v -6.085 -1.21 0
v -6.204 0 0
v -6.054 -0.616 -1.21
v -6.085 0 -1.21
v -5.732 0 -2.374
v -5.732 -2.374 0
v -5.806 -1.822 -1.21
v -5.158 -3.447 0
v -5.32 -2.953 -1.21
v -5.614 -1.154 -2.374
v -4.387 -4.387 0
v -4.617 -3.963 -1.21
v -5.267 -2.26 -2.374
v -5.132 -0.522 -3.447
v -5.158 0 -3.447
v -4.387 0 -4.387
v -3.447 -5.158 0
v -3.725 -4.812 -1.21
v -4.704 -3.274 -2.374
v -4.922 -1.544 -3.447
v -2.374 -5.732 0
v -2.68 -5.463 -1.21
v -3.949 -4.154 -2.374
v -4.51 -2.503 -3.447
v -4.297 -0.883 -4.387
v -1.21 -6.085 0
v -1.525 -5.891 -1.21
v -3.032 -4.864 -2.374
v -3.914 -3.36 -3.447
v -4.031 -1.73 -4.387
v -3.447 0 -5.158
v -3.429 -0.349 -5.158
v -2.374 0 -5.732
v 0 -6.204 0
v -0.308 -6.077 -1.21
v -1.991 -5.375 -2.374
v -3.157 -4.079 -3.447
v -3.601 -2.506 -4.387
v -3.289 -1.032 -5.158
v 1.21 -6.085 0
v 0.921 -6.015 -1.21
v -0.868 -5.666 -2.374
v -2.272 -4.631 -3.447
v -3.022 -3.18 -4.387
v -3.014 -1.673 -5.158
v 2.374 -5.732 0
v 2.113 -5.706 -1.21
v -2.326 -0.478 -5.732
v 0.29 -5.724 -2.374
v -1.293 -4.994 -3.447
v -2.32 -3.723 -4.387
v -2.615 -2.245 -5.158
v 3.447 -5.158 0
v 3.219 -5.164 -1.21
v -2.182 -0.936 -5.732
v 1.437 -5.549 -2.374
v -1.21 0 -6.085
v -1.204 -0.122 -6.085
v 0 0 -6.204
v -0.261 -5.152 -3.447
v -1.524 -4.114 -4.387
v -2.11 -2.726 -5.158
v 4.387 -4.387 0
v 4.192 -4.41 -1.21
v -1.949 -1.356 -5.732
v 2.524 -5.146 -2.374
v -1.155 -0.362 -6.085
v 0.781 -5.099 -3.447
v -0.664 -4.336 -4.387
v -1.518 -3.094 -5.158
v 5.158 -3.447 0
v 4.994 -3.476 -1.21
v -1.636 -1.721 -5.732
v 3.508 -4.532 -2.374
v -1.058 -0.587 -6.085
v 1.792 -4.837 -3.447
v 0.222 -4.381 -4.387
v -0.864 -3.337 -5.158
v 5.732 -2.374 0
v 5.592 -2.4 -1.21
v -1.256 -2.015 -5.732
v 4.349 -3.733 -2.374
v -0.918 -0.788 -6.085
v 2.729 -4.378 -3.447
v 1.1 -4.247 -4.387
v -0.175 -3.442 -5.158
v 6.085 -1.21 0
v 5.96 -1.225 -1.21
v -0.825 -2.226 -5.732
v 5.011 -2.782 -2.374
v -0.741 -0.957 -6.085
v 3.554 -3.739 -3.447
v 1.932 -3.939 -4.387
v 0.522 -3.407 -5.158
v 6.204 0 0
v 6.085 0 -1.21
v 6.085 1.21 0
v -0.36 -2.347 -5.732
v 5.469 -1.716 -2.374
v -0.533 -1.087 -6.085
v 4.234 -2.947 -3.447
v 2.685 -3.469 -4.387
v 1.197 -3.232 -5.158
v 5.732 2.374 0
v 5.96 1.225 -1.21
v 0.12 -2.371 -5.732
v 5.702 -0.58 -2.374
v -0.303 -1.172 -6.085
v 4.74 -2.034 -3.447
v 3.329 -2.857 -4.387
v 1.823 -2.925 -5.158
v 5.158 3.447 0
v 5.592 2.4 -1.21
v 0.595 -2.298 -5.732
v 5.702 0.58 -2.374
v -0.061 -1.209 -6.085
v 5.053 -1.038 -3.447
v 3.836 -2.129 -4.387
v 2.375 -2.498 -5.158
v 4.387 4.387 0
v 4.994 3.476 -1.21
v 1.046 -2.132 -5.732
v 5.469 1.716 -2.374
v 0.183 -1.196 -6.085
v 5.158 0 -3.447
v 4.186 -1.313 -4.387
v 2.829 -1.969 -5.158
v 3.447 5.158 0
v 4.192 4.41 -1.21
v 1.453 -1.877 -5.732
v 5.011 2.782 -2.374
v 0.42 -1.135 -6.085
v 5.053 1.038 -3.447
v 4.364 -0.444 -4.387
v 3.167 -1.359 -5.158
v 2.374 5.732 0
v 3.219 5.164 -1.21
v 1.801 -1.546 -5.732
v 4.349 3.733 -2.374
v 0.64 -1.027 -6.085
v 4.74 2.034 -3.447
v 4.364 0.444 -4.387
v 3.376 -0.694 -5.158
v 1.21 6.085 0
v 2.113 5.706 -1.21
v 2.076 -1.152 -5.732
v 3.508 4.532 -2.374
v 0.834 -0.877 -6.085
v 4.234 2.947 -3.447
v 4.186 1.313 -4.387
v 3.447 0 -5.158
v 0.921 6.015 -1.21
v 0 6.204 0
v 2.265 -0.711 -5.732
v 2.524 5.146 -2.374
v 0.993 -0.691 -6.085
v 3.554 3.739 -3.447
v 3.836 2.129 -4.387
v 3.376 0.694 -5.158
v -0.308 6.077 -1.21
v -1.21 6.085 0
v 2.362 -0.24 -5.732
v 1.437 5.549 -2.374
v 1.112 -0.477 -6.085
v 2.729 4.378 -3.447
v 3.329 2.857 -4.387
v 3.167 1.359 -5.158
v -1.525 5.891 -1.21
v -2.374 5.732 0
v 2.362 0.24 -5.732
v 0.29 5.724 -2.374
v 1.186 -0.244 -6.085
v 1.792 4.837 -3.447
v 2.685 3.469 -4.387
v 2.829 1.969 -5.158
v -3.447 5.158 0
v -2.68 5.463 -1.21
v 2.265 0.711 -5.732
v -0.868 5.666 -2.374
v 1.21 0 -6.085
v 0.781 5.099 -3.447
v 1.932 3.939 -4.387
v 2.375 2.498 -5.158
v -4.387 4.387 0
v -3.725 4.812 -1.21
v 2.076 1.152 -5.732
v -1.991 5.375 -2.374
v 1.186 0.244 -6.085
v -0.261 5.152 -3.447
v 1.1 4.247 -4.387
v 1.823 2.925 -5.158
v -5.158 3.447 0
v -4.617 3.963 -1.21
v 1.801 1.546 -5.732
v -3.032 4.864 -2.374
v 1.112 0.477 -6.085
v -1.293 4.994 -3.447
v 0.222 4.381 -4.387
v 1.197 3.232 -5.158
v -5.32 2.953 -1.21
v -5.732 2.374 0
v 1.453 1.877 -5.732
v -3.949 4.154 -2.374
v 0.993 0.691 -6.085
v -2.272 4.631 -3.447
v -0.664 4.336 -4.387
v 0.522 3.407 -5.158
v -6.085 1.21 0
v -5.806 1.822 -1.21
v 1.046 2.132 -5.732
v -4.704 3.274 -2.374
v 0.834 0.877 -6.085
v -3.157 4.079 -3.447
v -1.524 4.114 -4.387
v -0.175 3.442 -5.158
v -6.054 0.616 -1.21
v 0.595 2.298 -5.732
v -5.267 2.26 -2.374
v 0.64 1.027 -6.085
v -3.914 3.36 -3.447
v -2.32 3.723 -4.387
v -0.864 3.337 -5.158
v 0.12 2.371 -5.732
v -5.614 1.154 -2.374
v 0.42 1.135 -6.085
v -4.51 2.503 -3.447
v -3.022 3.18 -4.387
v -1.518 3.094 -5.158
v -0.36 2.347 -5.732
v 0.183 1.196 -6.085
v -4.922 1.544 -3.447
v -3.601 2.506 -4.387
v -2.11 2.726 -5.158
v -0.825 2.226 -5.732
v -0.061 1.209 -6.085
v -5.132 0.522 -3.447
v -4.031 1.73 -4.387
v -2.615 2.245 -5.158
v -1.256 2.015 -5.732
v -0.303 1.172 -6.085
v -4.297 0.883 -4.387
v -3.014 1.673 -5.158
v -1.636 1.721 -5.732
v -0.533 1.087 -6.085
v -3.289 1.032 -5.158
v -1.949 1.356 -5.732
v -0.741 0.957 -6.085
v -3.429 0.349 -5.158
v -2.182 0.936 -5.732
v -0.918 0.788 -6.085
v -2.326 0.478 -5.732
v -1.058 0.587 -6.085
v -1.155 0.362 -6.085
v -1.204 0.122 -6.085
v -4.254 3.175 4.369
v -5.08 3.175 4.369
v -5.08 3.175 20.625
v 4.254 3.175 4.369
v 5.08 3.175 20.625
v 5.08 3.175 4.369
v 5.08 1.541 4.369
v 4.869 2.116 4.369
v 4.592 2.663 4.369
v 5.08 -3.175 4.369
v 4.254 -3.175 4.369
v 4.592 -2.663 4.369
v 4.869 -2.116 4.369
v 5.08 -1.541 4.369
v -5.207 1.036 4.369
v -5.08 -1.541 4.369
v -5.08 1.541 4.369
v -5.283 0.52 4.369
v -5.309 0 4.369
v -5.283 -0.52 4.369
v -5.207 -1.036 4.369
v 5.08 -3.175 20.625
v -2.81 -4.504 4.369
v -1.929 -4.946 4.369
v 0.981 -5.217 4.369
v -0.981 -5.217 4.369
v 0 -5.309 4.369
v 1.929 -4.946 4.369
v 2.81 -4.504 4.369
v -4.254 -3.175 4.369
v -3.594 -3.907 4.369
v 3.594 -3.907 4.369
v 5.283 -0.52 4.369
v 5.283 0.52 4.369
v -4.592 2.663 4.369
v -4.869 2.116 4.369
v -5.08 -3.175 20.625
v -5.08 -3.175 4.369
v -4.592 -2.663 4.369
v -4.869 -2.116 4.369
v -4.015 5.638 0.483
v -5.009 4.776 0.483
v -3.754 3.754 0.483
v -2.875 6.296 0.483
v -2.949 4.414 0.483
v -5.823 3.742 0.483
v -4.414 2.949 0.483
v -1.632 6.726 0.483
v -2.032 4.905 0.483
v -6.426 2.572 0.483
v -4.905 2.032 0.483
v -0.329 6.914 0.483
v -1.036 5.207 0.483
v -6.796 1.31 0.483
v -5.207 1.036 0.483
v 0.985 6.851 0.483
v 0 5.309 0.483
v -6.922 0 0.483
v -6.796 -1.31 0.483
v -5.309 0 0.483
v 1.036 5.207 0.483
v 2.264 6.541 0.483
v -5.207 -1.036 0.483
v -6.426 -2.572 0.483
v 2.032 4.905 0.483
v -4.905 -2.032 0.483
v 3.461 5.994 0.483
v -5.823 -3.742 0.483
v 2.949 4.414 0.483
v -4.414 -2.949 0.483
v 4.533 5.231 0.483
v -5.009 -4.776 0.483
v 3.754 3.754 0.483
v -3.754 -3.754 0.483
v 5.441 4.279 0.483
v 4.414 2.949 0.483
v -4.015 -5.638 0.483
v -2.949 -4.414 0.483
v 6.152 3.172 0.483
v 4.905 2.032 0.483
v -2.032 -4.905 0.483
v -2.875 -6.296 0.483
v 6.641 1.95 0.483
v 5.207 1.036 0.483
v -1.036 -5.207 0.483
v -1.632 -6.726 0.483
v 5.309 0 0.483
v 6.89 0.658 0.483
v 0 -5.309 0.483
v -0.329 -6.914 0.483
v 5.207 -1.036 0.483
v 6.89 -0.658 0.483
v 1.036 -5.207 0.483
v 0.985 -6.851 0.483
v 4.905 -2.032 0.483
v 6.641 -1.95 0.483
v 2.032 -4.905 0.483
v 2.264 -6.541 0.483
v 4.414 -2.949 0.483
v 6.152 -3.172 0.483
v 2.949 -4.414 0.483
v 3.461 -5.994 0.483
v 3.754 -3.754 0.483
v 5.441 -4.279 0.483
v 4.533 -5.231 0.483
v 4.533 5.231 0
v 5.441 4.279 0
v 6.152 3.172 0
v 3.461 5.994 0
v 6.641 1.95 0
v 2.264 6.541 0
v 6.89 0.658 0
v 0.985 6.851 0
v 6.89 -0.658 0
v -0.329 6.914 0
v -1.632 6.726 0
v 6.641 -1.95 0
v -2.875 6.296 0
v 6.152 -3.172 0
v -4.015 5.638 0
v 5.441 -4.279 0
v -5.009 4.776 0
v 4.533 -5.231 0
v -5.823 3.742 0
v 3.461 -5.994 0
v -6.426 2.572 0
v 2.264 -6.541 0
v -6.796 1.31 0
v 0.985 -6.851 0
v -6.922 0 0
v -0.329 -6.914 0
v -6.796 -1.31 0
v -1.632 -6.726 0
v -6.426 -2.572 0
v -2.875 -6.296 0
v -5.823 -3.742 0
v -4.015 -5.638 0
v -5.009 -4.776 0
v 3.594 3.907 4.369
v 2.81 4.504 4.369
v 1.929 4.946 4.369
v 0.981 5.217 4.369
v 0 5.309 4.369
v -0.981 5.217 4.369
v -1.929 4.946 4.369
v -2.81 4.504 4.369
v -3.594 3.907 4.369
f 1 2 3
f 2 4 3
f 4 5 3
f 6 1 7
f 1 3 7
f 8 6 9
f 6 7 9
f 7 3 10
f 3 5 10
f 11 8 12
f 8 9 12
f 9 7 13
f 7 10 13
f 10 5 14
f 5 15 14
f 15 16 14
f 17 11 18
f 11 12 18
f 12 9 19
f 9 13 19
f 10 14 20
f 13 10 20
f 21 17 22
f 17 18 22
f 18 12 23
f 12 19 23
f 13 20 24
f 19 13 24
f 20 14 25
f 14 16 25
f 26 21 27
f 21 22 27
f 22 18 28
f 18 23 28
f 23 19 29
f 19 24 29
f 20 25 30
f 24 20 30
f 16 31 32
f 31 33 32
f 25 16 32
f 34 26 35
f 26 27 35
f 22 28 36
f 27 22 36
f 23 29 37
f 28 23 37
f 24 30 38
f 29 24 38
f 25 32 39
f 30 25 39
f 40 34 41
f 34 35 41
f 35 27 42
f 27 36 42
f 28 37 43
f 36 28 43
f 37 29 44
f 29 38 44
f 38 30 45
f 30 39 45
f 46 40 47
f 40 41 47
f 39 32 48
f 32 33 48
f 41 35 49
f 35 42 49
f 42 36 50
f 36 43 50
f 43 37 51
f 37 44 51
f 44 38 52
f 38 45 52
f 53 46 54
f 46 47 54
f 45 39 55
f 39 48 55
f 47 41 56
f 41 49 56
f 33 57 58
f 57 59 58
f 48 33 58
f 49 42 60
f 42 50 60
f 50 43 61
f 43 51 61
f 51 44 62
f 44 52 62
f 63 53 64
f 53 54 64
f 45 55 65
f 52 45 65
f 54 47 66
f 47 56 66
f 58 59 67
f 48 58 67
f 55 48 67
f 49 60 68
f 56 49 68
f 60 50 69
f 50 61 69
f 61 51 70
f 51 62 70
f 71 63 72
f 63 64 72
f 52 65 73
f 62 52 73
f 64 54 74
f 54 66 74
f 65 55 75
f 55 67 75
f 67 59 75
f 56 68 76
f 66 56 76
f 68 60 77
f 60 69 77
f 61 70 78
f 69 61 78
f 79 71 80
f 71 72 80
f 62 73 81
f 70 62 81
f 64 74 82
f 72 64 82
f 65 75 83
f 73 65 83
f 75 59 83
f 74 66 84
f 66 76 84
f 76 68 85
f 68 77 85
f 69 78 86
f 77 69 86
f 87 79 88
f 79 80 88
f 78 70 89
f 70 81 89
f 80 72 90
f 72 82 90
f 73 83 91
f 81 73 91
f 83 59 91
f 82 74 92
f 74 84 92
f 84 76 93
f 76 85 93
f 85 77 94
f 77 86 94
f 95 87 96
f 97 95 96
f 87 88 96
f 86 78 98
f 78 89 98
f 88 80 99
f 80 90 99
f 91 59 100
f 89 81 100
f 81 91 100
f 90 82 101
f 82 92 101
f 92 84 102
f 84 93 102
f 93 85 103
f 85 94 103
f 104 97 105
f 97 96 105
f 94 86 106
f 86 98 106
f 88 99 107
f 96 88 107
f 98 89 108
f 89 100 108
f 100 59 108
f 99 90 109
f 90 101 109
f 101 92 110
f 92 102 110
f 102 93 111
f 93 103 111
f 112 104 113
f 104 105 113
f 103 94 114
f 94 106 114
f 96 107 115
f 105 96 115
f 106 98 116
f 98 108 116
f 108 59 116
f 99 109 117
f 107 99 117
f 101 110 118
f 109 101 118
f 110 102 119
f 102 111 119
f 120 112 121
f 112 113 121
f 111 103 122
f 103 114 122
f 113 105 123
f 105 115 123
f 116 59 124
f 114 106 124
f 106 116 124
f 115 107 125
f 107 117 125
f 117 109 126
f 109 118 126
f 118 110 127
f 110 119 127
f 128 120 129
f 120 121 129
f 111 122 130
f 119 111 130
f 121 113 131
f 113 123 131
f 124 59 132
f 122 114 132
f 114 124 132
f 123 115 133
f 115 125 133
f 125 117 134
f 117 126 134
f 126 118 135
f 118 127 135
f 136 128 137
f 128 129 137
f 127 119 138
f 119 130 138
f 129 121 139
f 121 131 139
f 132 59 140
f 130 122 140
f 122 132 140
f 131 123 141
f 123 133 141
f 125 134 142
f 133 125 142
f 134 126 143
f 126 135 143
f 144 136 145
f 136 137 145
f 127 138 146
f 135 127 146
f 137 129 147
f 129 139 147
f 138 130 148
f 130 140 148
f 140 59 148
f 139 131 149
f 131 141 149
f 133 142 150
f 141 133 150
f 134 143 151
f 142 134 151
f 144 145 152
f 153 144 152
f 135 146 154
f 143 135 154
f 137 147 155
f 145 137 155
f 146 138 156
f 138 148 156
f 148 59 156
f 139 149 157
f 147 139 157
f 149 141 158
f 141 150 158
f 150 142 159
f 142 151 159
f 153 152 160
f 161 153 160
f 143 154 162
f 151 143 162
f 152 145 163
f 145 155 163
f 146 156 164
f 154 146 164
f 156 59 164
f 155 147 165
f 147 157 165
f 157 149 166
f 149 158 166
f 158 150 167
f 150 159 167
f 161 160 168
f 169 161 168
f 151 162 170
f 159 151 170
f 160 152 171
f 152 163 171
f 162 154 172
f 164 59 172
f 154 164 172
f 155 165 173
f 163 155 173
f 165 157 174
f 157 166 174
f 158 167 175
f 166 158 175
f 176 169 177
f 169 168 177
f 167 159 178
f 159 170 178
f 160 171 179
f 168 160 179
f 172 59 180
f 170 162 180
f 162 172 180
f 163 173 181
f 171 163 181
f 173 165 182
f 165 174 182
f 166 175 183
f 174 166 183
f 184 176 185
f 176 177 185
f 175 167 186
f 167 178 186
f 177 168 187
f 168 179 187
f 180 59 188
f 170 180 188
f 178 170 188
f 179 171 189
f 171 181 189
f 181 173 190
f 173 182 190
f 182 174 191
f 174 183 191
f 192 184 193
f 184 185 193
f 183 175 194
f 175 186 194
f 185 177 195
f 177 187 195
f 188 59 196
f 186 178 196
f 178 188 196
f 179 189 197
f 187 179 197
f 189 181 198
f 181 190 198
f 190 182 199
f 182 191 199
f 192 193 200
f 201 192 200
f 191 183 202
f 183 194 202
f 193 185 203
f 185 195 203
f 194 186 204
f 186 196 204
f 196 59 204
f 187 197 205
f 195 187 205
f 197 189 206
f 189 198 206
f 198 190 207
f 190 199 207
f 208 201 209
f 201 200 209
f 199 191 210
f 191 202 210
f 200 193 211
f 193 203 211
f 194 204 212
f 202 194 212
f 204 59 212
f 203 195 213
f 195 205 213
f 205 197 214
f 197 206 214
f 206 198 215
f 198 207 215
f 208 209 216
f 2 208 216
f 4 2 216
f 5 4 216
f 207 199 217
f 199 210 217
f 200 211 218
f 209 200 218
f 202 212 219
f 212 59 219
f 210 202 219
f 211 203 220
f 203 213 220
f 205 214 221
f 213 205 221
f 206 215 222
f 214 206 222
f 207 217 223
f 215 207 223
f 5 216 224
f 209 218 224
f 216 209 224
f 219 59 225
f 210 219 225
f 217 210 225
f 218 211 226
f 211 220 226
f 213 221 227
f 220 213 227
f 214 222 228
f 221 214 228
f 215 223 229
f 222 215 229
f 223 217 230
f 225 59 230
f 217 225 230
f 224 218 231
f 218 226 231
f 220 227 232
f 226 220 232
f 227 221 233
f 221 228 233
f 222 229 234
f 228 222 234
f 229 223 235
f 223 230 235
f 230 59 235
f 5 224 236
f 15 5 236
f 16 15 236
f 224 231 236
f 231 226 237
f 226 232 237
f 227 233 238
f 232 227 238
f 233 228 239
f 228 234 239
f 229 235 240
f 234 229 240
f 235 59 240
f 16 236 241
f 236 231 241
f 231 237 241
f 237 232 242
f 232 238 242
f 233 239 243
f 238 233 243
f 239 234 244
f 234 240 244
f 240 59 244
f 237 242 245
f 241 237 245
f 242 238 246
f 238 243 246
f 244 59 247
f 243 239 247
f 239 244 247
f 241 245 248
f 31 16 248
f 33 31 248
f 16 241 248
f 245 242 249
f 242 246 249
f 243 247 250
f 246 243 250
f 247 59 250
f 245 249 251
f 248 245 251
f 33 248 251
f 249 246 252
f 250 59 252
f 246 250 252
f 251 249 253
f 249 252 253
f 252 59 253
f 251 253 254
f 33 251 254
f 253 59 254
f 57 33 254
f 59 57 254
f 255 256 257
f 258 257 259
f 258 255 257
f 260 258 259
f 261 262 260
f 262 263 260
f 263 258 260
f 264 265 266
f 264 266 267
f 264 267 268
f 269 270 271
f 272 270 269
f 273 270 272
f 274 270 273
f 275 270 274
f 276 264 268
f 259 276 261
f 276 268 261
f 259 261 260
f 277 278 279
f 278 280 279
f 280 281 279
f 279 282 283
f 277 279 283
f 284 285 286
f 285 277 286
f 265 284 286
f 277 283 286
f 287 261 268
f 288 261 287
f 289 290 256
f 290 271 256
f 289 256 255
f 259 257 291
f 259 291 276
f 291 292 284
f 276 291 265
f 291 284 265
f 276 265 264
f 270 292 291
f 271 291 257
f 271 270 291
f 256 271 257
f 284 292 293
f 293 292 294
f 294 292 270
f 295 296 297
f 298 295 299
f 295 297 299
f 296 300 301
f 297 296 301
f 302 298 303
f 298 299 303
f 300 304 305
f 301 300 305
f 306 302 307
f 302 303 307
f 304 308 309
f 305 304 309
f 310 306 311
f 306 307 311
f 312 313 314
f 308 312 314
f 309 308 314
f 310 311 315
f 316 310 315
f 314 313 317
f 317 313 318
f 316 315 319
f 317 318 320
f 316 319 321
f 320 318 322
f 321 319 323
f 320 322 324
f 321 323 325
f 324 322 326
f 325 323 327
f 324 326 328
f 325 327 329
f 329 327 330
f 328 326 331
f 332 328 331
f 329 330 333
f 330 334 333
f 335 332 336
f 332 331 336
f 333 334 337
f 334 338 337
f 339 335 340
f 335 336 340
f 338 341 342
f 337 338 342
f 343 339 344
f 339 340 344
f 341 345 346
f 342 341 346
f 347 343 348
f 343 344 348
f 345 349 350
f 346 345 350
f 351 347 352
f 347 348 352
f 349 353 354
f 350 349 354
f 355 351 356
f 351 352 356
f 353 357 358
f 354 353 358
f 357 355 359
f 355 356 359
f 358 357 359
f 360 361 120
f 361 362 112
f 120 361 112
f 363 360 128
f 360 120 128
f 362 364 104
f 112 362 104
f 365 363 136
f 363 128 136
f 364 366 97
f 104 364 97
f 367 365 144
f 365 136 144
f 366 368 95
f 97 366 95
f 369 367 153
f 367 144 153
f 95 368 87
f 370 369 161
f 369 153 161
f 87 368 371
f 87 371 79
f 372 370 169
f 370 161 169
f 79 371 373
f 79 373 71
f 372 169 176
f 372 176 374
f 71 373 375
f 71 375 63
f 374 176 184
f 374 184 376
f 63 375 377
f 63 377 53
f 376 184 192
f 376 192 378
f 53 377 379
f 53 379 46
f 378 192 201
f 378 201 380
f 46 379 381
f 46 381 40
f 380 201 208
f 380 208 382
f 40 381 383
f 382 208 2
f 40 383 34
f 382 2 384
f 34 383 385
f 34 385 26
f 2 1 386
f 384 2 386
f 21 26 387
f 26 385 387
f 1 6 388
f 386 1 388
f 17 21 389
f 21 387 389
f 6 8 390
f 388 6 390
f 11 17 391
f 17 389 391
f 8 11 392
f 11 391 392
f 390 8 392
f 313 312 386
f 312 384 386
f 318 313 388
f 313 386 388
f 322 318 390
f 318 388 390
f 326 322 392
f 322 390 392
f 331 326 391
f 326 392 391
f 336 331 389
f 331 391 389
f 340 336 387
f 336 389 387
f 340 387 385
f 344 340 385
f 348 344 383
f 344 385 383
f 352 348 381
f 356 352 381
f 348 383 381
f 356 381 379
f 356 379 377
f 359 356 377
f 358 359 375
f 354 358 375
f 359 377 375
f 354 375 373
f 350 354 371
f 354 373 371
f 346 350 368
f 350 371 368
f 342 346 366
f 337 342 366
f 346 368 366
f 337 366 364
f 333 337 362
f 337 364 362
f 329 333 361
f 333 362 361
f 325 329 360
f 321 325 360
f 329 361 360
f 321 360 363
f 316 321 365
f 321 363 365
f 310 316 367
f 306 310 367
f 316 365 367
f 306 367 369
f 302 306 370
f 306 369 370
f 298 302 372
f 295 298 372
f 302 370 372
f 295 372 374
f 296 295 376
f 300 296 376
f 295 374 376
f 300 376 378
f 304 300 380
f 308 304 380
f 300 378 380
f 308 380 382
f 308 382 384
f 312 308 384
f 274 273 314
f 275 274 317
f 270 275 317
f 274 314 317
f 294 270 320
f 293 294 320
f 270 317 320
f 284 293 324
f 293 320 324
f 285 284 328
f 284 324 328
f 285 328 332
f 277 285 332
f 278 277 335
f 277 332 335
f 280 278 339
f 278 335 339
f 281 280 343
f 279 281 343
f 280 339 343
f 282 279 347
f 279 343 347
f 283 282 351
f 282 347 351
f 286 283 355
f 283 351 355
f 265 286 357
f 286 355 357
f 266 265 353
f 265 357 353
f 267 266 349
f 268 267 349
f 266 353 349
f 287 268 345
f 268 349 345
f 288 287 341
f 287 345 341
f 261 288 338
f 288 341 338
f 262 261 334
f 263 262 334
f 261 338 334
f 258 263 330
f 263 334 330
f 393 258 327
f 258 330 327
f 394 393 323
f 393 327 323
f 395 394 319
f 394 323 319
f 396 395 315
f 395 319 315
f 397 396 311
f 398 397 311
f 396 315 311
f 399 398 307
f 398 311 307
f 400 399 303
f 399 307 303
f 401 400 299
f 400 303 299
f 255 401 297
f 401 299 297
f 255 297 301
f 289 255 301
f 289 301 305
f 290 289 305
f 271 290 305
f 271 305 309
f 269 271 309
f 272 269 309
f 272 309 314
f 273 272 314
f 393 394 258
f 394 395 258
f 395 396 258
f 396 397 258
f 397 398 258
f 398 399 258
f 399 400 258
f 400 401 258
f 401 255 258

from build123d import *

# Parameters (mm, degrees)
SKETCH2_W           = 10.16
SKETCH2_H           = 6.35
BOSS_EXTRUDE1_DEPTH = 16.256


with BuildPart() as part:
    # Sketch1 → Revolve1 (revolve)
    with BuildSketch(Plane(origin=(0, 0, 0), x_dir=(1, 0, 0), z_dir=(0, 1, 0))):
        with BuildLine():
            Line((0, 6.20395), (0, -4.3688))
            Line((0, -4.3688), (-5.3086, -4.3688))
            Line((-5.3086, -4.3688), (-5.3086, -0.4826))
            Line((-5.3086, -0.4826), (-6.9215, -0.4826))
            Line((-6.9215, -0.4826), (-6.9215, 0))
            Line((-6.9215, 0), (-6.20395, 0))
            ThreePointArc((-6.20395, 0), (-4.386855115, 4.386855115), (0, 6.20395))
        make_face()
    revolve(axis=Axis((0, 0, -6.20395), (0, 0, 1)))

    # Sketch2 → Boss-Extrude1 (add)
    with BuildSketch(Plane.XY.offset(4.3688)):
        Rectangle(SKETCH2_W, SKETCH2_H)
    extrude(amount=BOSS_EXTRUDE1_DEPTH)


solid = part.part
